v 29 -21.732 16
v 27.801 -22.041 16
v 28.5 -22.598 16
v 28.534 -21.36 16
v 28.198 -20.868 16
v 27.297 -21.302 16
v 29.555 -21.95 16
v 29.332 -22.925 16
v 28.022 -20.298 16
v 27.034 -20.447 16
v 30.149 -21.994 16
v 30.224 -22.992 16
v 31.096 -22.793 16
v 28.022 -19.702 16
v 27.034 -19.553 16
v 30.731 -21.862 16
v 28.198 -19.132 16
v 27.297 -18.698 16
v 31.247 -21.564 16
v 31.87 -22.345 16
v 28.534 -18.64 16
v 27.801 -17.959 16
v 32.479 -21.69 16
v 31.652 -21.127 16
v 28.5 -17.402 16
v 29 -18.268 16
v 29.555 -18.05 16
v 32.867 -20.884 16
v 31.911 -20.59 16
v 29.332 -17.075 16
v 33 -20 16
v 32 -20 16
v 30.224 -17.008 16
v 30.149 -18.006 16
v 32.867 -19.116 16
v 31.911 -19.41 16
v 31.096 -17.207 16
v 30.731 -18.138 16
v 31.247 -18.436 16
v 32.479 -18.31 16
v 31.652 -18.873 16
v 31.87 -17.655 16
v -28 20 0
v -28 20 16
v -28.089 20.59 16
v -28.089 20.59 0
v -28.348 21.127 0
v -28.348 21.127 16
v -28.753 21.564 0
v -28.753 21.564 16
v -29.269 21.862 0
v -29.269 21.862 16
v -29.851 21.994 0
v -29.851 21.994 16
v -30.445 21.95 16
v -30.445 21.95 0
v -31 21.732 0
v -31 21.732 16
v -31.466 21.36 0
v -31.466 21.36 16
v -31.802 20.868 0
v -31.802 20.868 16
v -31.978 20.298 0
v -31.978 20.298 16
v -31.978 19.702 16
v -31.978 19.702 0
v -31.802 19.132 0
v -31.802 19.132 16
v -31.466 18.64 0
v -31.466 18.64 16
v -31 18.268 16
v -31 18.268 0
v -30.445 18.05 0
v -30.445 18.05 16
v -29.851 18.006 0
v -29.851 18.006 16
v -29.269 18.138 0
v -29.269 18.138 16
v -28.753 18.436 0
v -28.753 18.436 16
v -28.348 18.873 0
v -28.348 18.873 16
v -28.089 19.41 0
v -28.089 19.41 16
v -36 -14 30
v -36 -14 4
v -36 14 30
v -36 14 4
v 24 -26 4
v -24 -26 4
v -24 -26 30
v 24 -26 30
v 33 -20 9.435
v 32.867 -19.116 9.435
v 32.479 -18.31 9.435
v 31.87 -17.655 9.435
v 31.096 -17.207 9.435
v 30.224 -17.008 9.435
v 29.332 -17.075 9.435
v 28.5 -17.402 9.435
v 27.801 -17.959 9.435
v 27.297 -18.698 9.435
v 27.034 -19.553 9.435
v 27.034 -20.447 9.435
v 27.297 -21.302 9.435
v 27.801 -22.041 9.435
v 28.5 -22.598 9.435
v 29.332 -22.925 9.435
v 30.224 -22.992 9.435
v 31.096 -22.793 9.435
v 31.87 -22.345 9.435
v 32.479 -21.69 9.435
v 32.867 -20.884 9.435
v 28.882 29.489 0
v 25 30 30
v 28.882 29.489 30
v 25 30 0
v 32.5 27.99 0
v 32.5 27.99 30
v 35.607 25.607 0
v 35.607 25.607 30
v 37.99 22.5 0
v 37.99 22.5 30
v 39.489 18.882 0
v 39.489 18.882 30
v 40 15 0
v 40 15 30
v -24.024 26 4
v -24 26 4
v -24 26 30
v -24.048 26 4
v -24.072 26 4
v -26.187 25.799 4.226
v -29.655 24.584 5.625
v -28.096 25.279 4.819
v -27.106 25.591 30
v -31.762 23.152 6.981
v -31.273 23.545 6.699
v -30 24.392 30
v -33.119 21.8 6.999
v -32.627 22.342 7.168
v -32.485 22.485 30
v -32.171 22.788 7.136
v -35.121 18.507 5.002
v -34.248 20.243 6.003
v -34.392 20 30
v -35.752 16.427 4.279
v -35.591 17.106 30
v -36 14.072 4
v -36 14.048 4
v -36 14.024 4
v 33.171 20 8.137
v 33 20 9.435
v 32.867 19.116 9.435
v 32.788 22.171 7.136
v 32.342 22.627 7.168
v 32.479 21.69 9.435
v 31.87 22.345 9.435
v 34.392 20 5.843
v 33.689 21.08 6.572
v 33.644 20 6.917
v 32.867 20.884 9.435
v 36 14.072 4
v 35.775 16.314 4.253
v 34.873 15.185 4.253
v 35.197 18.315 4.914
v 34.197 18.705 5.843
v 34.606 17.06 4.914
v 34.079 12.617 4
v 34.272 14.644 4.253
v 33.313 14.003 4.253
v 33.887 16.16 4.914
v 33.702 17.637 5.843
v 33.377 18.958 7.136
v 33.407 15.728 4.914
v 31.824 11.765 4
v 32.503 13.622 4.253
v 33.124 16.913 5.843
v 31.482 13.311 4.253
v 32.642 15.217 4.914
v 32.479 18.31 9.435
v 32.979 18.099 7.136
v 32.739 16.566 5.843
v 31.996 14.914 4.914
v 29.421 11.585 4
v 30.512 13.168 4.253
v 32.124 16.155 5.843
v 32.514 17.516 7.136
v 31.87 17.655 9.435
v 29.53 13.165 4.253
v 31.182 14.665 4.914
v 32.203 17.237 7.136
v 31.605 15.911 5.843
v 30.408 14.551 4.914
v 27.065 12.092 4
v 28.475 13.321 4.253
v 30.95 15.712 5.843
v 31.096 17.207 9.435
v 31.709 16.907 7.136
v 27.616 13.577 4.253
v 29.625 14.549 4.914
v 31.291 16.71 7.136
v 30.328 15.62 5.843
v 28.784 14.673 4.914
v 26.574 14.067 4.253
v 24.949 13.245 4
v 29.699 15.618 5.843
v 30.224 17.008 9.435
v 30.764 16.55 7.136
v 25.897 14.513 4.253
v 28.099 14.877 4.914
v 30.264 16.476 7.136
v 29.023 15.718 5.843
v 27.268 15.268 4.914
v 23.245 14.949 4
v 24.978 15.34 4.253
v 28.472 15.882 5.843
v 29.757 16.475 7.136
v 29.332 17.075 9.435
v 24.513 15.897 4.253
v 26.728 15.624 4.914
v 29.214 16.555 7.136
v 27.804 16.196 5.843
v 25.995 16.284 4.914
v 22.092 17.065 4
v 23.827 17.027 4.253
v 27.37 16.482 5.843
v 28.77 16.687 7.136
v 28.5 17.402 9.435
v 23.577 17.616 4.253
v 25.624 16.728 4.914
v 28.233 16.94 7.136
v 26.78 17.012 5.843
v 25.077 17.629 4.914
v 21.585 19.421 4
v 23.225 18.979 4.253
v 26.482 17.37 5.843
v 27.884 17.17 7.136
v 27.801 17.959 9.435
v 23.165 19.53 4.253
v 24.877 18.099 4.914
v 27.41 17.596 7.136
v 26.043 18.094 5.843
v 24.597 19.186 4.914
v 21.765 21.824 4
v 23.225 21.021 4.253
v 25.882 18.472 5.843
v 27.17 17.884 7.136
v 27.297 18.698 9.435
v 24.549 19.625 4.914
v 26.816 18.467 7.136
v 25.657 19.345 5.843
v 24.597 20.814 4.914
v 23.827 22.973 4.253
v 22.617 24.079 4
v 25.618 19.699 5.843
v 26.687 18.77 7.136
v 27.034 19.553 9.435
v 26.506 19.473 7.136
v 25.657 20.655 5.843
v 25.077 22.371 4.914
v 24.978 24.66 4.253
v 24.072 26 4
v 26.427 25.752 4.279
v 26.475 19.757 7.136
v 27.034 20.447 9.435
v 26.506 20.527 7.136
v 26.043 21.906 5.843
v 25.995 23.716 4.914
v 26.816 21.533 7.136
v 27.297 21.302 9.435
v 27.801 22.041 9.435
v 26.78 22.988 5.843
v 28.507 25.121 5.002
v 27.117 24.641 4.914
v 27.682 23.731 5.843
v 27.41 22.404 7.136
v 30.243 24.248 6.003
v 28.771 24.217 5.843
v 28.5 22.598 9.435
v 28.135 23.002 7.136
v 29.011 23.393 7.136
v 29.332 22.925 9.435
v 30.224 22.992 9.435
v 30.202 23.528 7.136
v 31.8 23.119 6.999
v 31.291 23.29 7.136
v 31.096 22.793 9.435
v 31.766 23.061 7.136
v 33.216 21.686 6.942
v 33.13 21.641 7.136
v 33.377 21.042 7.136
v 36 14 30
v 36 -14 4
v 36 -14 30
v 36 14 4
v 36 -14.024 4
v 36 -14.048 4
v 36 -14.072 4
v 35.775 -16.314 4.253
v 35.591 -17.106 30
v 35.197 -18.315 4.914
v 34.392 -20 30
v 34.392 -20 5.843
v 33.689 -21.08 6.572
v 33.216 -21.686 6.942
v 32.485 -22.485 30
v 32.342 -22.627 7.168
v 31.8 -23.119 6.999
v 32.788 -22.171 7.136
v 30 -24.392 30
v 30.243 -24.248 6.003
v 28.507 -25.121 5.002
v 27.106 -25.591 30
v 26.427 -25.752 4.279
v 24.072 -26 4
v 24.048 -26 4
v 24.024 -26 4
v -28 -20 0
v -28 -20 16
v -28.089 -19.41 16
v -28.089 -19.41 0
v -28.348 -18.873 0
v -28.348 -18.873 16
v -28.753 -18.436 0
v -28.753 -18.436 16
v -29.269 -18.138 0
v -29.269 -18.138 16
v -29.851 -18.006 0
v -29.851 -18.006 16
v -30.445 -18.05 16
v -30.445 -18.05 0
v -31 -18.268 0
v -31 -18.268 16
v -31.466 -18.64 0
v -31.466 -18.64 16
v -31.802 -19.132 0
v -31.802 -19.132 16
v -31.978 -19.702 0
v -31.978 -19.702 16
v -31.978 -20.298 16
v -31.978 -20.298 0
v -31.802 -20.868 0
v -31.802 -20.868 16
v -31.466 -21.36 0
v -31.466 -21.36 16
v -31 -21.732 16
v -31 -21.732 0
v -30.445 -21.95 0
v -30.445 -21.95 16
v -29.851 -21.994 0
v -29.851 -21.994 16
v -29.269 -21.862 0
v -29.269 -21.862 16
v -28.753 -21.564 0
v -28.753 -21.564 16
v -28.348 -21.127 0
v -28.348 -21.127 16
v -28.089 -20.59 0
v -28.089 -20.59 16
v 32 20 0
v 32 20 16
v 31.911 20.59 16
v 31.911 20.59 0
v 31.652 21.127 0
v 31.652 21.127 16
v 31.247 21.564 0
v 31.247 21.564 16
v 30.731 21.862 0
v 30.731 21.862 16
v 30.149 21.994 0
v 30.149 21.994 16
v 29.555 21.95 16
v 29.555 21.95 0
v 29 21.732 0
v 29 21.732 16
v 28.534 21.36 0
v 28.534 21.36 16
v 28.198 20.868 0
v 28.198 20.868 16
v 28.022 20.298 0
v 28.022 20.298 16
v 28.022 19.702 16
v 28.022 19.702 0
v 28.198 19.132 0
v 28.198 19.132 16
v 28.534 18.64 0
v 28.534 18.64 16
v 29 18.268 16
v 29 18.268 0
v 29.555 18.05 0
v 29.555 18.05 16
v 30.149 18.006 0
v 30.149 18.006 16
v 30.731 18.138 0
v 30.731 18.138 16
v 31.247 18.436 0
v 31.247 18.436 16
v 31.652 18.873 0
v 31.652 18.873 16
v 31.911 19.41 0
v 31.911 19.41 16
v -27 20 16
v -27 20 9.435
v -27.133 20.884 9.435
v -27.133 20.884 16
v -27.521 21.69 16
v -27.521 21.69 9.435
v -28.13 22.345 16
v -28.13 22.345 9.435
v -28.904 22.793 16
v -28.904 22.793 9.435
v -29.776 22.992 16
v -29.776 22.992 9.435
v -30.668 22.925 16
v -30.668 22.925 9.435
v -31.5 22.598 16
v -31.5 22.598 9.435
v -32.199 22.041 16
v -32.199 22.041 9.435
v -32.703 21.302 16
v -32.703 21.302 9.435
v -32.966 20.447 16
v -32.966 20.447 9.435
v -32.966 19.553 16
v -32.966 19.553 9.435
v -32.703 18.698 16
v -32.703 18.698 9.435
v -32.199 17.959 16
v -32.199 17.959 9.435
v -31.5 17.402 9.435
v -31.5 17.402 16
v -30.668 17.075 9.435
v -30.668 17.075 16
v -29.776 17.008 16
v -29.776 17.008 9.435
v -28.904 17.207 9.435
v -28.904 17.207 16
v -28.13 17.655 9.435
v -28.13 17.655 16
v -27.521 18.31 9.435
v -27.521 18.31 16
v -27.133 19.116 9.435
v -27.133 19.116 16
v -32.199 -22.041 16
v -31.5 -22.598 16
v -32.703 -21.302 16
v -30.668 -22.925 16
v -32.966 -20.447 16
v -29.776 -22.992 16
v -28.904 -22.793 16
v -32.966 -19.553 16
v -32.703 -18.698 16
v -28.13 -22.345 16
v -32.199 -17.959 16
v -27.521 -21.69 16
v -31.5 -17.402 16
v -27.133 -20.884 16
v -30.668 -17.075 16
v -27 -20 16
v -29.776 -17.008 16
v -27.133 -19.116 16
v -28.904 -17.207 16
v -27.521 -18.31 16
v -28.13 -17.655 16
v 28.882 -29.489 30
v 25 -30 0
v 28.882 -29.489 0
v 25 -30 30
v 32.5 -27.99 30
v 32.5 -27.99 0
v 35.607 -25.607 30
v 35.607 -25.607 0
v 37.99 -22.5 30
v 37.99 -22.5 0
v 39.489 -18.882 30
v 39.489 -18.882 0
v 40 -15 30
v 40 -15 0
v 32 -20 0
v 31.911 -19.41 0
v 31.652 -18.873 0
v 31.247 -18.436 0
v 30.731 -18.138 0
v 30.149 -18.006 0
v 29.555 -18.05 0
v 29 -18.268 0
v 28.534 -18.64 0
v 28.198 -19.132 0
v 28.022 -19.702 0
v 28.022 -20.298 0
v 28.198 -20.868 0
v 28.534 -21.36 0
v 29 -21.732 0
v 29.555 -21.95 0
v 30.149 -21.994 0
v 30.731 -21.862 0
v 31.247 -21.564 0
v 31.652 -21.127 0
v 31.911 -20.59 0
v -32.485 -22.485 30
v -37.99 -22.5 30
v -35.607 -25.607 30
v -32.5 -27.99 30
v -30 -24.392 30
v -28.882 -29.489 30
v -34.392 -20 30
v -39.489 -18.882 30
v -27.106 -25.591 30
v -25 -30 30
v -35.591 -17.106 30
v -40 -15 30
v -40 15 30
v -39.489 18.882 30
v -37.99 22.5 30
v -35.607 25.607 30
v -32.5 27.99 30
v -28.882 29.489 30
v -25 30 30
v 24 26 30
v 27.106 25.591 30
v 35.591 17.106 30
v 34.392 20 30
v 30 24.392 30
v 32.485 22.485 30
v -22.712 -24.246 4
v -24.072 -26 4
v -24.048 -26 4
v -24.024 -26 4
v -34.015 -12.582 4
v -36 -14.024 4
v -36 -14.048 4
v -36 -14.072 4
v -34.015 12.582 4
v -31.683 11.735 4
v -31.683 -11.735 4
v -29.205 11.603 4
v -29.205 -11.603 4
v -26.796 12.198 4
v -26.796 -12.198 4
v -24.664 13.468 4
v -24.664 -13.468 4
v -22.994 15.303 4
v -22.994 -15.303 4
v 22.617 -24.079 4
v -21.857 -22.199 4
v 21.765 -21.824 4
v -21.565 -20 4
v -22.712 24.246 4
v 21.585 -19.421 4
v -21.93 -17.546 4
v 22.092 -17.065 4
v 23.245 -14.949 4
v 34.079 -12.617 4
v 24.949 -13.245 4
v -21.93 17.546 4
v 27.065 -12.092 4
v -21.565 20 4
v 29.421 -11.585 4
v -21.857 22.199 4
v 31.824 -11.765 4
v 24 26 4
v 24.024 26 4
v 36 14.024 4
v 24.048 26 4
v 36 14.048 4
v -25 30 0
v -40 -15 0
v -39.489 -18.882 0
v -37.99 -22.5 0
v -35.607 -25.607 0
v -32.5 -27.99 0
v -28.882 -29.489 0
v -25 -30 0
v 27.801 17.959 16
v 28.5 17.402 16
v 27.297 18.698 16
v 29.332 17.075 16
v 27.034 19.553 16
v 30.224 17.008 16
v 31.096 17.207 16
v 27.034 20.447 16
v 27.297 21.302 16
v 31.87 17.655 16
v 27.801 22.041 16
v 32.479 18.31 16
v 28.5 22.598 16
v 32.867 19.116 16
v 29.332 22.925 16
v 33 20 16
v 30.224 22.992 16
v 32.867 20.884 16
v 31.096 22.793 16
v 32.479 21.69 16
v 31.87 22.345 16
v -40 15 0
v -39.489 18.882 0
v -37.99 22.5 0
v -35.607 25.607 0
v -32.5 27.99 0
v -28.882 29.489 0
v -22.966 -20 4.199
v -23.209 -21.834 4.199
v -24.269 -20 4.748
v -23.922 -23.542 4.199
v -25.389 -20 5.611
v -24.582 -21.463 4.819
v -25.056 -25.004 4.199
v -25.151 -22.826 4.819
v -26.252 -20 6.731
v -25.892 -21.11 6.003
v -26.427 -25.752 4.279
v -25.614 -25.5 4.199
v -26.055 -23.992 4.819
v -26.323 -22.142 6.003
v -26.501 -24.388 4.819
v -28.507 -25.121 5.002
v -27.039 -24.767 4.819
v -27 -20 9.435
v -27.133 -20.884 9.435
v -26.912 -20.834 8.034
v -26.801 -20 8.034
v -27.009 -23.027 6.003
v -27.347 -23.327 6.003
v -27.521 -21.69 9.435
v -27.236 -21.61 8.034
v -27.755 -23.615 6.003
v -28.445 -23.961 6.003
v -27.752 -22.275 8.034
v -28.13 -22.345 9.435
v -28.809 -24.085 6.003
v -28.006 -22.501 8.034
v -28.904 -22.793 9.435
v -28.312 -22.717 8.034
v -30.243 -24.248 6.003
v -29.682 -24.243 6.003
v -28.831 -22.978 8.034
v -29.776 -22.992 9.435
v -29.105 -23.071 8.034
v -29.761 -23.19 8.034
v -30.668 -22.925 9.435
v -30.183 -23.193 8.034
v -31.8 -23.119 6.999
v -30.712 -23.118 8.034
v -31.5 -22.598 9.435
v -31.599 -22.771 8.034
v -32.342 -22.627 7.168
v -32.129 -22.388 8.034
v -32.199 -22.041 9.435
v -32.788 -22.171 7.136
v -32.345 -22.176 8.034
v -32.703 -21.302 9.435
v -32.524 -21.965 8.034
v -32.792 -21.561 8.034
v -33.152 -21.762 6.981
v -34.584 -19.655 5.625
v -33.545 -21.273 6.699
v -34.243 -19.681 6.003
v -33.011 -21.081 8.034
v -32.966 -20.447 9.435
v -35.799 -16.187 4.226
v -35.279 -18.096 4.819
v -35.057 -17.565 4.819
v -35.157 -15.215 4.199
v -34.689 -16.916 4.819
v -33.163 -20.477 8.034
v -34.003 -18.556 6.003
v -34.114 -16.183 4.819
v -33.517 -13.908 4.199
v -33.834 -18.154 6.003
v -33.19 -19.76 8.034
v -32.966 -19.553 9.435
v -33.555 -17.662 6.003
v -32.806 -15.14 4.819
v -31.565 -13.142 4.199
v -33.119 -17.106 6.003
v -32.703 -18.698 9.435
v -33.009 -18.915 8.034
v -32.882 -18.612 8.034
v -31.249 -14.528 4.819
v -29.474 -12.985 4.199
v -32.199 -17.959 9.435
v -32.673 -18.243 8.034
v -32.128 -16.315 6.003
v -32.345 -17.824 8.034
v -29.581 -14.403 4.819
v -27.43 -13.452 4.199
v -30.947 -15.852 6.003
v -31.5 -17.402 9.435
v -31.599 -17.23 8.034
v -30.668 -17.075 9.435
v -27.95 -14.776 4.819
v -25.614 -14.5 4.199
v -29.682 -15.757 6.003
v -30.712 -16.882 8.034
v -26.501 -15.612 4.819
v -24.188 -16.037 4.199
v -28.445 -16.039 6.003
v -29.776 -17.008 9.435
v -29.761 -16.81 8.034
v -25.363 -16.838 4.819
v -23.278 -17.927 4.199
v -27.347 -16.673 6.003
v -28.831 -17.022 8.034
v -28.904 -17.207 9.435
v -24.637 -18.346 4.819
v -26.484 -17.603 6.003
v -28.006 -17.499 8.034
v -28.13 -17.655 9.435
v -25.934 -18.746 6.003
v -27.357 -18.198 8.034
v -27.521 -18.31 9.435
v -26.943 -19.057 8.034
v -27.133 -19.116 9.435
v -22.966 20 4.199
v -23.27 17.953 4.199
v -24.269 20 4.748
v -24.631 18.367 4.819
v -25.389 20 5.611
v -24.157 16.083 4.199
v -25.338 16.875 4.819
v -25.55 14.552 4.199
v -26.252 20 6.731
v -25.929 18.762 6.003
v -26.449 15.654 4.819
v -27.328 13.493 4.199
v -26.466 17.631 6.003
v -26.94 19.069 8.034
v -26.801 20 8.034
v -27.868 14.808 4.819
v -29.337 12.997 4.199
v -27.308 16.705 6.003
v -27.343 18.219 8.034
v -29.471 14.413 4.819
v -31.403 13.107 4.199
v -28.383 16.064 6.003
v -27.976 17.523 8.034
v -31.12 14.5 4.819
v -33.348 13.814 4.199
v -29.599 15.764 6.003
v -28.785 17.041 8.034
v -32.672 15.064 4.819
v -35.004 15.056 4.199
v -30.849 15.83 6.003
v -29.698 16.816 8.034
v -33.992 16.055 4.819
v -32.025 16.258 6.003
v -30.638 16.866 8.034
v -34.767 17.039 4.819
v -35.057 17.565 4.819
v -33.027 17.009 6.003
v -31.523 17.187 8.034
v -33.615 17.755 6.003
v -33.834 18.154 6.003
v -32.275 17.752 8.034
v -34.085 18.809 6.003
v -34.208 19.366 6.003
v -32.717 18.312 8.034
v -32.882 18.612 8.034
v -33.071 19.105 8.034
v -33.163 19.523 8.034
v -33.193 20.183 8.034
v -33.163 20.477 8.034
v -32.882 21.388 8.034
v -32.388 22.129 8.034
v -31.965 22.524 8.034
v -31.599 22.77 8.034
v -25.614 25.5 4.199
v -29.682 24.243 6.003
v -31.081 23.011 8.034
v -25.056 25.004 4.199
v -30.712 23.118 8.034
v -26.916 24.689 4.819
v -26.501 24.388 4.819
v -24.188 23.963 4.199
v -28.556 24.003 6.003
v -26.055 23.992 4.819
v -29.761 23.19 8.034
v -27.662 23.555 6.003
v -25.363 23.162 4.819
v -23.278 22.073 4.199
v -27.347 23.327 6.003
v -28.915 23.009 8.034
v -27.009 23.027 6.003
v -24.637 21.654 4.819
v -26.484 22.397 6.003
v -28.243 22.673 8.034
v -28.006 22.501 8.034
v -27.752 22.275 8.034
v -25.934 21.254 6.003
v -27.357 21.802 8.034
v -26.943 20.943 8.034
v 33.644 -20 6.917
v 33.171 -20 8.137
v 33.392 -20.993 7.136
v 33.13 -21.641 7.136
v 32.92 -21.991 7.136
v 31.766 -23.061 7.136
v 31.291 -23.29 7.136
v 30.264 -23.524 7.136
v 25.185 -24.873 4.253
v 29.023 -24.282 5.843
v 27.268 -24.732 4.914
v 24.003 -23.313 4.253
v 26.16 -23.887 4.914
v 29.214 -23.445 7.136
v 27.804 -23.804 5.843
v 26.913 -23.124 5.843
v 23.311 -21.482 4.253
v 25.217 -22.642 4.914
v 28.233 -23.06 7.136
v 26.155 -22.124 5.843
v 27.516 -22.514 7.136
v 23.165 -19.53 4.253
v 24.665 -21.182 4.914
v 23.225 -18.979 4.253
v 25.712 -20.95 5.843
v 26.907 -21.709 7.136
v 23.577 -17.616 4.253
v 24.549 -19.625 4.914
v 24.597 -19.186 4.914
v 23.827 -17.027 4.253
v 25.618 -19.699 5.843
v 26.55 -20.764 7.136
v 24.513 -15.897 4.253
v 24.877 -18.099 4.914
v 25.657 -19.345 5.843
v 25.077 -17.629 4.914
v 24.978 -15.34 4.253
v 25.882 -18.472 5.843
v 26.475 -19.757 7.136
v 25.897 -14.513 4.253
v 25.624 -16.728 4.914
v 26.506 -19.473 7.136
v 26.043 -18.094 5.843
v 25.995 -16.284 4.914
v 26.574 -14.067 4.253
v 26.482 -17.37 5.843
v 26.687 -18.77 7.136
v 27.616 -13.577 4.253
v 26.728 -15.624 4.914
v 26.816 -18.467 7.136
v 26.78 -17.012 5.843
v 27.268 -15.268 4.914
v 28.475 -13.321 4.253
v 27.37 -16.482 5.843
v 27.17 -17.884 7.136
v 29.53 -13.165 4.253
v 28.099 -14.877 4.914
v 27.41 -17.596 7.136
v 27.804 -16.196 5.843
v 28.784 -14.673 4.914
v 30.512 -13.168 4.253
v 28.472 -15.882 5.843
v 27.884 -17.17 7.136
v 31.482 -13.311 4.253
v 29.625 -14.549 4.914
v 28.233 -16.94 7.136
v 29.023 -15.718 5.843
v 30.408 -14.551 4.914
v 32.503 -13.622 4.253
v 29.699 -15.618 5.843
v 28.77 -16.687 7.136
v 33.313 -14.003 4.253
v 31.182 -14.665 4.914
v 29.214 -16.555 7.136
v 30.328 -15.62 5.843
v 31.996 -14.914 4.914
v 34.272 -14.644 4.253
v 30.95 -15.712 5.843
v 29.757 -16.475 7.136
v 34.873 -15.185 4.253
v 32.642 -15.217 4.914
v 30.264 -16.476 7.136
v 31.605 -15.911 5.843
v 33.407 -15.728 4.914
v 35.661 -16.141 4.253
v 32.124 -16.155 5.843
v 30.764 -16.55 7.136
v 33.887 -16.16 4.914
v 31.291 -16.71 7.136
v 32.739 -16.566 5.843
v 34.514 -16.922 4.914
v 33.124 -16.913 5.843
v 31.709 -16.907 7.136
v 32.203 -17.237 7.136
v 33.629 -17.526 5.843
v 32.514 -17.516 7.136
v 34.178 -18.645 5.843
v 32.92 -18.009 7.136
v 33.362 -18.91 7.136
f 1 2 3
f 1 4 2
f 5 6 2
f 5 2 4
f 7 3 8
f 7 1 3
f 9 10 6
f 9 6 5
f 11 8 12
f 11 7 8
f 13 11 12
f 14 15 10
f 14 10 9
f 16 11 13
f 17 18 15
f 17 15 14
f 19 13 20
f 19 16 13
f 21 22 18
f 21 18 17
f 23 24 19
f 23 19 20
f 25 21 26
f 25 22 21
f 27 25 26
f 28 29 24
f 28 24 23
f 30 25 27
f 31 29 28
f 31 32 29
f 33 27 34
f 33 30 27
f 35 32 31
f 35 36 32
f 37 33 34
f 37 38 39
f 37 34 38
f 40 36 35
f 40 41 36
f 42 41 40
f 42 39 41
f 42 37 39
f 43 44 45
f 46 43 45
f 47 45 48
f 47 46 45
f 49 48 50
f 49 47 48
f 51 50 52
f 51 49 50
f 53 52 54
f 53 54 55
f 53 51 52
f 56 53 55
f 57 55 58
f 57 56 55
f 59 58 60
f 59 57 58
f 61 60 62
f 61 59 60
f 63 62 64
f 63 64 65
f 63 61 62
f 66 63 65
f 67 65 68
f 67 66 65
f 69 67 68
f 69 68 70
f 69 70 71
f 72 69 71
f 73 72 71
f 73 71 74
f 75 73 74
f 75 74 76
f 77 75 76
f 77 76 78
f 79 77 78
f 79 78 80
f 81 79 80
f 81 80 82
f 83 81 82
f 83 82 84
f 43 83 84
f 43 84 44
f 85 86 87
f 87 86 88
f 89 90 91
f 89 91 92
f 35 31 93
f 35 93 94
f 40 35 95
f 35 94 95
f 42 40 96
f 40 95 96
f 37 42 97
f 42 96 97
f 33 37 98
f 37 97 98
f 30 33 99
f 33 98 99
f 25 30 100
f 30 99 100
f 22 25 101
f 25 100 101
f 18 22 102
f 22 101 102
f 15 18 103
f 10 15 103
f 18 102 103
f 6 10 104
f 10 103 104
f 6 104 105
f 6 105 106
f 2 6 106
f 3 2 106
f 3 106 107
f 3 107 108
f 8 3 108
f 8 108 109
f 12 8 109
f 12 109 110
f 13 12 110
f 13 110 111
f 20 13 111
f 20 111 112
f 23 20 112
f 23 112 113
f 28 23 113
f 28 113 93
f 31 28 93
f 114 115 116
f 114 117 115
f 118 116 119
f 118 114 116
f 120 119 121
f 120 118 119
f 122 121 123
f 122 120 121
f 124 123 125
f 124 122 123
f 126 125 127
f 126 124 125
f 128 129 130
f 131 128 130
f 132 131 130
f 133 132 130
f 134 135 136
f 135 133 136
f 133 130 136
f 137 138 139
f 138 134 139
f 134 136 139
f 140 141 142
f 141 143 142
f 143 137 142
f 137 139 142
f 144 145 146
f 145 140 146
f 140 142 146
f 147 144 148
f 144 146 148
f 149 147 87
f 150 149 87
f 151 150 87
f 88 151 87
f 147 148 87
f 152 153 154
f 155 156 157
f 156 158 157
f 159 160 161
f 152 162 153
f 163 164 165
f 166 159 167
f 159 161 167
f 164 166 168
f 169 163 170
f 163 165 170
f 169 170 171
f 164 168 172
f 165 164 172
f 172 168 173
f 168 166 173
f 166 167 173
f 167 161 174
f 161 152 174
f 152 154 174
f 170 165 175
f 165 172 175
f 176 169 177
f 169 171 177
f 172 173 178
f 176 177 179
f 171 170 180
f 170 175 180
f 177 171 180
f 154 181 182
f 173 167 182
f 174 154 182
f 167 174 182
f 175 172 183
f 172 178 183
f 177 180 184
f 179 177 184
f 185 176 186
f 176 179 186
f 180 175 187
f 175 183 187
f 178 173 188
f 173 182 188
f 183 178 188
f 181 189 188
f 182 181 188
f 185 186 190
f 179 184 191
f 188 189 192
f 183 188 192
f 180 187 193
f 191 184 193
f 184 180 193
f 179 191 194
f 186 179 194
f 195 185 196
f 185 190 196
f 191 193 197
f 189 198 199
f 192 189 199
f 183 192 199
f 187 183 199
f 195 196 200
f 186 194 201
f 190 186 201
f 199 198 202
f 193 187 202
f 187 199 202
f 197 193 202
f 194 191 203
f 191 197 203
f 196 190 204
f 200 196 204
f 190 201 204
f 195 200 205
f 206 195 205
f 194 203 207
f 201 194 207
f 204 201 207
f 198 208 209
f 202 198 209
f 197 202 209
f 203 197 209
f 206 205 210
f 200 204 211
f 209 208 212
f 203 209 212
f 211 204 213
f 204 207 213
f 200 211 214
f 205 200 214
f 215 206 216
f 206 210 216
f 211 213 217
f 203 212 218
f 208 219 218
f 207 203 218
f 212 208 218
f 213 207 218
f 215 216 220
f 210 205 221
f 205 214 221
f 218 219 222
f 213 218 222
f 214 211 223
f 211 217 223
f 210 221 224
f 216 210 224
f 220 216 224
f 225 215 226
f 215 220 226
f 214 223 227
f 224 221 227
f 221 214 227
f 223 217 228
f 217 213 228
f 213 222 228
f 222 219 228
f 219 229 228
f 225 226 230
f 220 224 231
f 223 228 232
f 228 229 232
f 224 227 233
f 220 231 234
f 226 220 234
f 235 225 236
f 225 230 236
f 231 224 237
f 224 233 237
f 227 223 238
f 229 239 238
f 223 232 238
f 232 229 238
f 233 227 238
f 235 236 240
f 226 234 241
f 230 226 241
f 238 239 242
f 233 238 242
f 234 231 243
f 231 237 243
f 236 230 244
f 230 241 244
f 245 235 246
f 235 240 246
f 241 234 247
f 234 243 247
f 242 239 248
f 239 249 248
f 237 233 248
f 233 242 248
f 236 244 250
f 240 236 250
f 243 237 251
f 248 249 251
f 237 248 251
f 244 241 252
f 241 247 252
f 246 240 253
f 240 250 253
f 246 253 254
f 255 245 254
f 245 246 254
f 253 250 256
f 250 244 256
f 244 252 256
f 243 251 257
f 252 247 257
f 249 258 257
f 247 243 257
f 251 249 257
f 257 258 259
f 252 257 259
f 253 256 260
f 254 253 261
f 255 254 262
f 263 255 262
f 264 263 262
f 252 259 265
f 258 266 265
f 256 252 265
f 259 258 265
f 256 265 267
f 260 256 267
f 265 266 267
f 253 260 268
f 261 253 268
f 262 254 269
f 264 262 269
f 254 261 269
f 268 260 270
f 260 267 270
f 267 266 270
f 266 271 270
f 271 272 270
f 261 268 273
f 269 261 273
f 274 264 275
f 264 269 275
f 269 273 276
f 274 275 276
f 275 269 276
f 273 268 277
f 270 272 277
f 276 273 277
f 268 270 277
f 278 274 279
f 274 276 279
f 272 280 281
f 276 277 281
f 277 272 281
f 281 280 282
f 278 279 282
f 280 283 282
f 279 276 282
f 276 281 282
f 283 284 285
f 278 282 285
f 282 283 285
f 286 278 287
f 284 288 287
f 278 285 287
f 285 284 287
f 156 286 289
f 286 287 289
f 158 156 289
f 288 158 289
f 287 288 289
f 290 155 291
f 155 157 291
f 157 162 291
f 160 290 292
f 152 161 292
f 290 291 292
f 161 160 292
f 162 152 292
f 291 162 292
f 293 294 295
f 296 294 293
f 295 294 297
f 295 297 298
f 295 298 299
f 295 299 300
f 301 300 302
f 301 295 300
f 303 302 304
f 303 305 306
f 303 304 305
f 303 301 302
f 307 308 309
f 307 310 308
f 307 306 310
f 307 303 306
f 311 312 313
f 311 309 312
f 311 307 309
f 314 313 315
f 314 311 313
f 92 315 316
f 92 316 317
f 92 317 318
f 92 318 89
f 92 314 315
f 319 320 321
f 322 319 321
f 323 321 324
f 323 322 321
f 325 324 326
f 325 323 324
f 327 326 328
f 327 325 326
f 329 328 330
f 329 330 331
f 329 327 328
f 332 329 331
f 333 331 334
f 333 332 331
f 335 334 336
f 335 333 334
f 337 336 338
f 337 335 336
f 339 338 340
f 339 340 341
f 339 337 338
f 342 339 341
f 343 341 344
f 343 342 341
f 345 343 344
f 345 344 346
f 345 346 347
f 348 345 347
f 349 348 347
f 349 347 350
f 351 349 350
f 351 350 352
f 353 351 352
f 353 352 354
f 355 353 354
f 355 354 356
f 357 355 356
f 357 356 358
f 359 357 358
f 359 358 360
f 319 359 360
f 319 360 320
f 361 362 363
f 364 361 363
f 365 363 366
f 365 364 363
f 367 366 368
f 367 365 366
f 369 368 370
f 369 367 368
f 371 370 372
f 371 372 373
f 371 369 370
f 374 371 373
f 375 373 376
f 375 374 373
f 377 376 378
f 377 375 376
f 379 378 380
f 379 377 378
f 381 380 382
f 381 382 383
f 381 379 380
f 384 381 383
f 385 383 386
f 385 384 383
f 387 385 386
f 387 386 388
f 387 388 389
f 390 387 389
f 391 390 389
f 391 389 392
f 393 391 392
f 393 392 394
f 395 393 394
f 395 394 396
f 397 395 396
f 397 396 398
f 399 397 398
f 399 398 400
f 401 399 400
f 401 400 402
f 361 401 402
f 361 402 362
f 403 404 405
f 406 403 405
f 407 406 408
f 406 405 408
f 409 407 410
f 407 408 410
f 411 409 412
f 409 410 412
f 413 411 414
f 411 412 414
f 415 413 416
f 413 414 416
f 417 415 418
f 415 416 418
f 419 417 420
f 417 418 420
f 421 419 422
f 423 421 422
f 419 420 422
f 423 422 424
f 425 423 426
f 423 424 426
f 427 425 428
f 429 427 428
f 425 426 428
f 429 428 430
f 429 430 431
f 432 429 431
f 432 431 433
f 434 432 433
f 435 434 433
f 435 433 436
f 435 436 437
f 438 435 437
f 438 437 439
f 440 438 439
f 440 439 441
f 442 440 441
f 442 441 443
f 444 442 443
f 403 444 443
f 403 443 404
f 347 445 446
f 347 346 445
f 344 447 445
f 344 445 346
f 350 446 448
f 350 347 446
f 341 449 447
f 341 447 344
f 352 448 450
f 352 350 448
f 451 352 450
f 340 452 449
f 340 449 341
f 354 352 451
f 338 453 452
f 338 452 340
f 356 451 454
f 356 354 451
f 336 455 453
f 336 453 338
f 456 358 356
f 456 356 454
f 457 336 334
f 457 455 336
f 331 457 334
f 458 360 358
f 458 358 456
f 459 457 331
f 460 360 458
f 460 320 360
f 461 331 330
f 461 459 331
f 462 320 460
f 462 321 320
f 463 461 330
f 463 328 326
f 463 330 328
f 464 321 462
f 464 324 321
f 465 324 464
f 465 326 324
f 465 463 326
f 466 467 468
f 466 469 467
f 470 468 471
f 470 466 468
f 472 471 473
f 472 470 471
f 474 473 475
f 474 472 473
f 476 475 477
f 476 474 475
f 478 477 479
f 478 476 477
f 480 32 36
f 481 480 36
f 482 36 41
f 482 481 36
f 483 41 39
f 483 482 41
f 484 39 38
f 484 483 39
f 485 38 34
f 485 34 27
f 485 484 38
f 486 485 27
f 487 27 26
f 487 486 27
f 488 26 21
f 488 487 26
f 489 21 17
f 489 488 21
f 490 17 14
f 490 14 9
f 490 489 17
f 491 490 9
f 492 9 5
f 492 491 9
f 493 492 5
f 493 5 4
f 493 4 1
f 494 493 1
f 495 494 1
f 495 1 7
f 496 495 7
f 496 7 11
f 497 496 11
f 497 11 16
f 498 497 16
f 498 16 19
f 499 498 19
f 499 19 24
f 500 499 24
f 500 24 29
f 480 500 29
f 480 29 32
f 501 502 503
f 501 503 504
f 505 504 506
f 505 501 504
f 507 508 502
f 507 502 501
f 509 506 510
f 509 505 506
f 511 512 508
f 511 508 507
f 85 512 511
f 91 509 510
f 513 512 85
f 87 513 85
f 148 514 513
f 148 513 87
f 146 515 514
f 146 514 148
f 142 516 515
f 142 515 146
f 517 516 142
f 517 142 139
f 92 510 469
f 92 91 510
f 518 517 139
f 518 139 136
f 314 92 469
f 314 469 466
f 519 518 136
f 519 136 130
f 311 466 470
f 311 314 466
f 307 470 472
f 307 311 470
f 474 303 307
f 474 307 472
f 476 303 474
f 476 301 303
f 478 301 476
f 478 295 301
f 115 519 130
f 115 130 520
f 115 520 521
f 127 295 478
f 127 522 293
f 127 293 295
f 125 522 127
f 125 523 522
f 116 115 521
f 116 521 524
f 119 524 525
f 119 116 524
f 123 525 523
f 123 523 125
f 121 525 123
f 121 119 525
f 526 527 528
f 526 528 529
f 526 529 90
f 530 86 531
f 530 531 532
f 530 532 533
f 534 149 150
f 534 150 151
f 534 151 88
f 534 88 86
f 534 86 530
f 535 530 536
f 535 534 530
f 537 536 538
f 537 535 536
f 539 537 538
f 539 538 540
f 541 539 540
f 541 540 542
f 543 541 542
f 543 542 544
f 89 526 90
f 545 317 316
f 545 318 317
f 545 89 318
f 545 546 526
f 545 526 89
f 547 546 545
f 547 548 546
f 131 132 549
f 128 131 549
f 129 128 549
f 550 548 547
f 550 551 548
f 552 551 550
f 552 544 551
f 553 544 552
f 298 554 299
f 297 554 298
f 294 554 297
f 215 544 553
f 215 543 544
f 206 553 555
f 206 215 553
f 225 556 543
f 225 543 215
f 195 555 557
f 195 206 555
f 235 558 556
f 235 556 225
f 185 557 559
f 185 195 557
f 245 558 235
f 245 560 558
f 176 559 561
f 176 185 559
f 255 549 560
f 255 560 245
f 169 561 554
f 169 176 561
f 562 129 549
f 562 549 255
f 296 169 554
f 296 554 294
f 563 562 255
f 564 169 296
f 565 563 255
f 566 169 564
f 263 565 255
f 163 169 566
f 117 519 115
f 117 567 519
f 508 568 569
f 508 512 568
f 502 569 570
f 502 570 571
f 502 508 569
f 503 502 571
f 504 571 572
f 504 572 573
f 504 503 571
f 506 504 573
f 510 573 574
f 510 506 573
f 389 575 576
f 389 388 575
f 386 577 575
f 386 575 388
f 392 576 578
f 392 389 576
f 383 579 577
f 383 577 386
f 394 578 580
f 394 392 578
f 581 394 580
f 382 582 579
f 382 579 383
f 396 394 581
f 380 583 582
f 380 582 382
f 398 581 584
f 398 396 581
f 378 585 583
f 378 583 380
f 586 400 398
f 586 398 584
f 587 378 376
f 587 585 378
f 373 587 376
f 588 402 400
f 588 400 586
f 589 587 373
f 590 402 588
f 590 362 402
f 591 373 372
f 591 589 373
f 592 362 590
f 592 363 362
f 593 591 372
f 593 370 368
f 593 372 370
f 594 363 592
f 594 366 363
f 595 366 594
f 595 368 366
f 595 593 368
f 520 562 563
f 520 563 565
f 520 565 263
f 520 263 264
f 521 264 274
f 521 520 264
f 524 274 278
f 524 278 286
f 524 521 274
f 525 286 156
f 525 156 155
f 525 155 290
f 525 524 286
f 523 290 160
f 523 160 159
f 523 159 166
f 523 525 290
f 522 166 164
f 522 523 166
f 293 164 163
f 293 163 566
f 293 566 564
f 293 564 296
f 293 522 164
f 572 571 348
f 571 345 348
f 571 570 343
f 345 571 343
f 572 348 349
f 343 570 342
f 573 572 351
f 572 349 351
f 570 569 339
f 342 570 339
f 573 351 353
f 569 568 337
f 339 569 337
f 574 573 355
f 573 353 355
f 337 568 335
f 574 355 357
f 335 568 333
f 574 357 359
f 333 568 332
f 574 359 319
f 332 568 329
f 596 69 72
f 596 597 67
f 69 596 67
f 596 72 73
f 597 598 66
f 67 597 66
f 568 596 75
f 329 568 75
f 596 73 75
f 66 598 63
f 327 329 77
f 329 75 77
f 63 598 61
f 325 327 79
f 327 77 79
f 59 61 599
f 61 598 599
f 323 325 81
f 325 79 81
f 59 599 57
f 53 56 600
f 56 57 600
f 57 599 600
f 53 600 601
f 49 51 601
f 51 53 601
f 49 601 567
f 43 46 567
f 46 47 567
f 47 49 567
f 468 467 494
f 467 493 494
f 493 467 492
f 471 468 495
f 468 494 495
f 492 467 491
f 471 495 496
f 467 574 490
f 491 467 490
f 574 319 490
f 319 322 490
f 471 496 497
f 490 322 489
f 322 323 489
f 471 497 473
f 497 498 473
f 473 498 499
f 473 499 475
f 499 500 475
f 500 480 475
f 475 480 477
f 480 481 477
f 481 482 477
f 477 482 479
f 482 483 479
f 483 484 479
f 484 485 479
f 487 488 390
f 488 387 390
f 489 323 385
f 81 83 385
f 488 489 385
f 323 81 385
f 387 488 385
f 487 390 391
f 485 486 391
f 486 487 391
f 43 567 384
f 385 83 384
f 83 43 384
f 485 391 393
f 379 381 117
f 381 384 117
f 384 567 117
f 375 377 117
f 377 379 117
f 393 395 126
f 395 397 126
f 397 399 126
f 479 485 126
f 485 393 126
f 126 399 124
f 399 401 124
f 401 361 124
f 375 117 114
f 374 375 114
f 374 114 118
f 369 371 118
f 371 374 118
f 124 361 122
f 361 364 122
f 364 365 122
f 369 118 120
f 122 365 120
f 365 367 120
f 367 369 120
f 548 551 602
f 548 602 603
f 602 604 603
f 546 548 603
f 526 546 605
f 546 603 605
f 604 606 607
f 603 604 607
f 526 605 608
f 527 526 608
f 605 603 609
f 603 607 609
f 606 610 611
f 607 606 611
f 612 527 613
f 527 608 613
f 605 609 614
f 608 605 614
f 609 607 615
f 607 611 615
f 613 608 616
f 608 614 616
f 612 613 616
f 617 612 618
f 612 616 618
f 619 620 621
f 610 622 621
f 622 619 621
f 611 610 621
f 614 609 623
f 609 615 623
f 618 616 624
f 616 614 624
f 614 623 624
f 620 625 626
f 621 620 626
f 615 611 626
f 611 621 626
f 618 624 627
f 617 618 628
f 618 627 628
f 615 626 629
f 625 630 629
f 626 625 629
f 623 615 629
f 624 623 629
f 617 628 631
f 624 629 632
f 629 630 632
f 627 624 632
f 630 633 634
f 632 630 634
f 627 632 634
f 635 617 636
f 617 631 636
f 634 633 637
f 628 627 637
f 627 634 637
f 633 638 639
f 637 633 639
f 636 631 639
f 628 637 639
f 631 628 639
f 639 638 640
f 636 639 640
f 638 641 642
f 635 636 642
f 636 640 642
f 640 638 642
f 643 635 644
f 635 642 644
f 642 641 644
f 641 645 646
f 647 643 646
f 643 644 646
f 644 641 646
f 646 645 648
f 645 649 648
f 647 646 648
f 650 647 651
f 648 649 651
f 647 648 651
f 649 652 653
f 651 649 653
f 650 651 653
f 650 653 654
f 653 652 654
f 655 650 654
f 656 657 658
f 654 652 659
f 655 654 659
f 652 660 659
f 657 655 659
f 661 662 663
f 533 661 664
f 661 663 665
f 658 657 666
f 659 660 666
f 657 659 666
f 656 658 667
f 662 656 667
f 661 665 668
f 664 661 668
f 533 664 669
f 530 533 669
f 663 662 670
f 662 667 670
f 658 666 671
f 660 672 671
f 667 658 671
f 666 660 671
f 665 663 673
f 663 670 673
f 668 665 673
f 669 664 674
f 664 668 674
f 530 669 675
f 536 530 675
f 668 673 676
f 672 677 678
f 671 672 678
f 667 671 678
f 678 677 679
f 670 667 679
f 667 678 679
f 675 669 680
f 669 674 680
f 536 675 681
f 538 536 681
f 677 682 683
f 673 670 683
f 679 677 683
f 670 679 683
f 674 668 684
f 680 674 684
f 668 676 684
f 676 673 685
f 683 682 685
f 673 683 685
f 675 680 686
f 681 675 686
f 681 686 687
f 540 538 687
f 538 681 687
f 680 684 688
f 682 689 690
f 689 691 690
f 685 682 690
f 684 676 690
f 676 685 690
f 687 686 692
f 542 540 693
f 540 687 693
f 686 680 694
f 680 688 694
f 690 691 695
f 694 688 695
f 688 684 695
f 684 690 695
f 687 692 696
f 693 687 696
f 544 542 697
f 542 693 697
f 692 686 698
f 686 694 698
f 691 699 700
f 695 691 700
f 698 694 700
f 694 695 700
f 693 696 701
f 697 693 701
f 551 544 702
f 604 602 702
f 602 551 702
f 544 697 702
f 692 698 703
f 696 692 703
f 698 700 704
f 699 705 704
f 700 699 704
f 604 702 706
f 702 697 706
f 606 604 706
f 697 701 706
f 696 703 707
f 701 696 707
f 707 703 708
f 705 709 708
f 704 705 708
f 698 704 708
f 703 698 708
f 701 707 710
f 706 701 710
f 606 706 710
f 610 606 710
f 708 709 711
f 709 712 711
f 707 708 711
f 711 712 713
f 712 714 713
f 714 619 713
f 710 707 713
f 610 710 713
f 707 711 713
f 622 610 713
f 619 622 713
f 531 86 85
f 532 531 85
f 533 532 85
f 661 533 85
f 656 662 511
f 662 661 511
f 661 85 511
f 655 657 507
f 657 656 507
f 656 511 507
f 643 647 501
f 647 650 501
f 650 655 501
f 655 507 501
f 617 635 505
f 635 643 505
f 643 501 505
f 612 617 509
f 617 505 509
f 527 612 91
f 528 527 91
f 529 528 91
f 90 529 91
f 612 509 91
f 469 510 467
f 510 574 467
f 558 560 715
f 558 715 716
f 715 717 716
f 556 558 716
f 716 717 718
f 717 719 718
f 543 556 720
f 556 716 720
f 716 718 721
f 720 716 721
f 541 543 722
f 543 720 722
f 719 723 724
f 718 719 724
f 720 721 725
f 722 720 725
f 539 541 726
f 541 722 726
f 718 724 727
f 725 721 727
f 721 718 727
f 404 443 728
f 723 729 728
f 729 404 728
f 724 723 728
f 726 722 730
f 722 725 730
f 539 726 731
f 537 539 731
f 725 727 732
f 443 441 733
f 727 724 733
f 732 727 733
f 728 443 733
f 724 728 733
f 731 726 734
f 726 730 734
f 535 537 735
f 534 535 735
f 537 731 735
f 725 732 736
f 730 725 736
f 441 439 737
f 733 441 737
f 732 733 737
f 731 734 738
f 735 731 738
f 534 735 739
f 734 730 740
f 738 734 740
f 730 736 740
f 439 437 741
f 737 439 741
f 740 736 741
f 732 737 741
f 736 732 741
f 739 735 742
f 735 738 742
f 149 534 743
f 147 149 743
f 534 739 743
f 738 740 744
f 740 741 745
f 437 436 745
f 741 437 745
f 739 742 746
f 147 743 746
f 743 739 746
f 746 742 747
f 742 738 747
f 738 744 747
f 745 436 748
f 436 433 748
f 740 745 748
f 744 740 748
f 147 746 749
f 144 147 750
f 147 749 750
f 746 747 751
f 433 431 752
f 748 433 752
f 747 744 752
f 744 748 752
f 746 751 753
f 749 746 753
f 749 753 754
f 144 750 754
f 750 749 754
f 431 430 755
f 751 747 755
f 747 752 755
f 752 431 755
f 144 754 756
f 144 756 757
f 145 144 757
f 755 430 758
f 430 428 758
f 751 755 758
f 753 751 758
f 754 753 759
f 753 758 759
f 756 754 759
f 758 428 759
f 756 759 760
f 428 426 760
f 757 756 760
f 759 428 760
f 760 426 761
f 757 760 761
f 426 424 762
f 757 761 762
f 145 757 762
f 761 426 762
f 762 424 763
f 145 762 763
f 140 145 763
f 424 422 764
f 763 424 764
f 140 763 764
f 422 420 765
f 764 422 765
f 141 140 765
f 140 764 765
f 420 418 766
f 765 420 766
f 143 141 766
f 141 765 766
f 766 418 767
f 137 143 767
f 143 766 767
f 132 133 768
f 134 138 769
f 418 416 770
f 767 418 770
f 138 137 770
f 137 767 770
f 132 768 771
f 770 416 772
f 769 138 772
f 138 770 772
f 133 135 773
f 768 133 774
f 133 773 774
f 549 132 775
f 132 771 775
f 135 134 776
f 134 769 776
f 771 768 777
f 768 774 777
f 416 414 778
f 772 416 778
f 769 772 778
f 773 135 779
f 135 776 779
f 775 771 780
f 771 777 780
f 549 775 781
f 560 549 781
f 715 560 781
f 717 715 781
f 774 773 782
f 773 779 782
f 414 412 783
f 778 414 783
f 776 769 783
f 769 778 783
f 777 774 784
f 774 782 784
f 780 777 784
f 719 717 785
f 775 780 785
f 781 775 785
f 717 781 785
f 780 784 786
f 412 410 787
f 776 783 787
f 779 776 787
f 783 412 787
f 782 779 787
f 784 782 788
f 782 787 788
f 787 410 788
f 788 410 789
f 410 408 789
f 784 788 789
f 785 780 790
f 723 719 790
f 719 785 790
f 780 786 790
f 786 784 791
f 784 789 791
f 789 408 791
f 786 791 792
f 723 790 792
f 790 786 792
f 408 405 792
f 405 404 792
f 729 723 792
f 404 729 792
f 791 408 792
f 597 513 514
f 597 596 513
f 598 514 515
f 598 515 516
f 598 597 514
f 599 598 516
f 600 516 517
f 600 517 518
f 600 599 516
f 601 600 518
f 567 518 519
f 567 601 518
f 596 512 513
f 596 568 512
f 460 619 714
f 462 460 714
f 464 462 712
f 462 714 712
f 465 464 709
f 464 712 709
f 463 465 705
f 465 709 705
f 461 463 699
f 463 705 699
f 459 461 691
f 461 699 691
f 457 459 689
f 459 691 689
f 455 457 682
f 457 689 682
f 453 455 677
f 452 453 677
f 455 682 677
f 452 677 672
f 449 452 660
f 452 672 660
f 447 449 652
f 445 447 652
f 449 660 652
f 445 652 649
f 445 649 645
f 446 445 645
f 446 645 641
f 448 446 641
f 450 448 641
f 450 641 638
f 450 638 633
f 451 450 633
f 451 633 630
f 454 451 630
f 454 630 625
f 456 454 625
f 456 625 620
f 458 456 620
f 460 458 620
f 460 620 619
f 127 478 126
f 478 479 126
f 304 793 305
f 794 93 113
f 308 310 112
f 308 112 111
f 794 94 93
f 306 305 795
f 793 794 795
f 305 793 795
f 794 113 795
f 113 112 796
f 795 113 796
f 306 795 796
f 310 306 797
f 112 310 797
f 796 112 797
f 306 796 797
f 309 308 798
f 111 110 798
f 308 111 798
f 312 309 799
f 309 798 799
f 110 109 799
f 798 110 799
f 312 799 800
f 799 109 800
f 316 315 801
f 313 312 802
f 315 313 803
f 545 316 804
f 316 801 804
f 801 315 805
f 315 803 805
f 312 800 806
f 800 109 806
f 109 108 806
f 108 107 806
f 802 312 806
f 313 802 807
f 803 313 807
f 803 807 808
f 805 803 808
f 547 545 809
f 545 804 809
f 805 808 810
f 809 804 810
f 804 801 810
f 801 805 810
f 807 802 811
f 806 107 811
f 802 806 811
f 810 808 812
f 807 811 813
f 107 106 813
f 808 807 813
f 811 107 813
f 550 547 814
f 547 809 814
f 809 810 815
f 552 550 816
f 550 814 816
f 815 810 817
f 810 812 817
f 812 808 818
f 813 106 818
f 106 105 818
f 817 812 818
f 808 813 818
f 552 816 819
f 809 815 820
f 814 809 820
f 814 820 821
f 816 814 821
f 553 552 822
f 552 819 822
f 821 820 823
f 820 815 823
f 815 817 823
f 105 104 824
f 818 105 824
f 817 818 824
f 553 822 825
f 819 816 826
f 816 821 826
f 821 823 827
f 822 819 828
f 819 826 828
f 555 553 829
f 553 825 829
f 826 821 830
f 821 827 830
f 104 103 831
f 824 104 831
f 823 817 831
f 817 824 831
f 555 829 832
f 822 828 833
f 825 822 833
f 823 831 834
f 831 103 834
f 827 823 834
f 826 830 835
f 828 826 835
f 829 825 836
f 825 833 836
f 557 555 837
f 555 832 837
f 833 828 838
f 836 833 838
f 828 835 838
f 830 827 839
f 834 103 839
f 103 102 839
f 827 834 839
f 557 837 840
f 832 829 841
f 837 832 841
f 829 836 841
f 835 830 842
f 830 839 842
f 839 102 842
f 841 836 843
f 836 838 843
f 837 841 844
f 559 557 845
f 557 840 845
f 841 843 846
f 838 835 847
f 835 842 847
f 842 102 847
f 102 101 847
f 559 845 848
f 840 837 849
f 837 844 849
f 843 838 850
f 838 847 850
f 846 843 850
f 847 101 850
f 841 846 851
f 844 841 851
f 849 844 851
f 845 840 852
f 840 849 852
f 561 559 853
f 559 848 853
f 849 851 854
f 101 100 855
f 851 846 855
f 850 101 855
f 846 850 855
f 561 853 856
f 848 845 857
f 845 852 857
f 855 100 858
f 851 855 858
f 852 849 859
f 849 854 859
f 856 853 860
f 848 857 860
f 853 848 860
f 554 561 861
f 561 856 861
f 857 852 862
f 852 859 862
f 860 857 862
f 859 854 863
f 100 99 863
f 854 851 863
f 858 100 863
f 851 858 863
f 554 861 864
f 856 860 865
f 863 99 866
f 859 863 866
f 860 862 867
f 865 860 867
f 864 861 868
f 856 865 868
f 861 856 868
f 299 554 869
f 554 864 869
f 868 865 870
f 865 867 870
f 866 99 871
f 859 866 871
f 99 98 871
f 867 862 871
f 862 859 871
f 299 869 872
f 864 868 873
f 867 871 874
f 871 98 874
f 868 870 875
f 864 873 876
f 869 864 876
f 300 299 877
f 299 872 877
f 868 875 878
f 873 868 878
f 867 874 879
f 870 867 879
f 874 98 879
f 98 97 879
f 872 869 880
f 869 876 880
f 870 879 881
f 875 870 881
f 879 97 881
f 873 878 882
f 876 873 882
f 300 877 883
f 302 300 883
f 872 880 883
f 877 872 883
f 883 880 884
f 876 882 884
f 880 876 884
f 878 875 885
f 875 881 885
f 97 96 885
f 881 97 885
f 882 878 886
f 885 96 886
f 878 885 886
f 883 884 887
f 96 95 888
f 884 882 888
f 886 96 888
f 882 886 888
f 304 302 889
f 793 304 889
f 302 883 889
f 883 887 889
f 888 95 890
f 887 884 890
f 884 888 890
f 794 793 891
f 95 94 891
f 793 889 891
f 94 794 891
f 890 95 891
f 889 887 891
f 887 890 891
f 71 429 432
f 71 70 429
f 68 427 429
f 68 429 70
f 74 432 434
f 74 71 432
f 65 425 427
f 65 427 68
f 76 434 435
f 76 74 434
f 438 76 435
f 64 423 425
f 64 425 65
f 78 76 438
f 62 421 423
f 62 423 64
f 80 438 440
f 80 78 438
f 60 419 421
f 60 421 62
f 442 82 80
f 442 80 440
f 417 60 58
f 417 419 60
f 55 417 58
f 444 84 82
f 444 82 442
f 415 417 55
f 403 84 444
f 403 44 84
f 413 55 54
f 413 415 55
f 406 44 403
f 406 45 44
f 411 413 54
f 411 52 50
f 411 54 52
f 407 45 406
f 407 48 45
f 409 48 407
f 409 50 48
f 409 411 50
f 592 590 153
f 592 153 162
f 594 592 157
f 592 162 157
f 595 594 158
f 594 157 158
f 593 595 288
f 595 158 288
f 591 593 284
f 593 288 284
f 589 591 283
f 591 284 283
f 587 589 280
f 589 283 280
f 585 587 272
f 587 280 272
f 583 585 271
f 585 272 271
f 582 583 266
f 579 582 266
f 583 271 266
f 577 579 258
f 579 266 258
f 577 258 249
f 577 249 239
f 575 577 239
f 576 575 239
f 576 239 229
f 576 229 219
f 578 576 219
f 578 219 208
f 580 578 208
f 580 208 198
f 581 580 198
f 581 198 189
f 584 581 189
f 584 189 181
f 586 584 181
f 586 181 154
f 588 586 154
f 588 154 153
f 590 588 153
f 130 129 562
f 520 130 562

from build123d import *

# Parameters (mm, degrees)
F0_W         = 80
F0_H         = 60
F0_W_2       = 72
F0_H_2       = 52
F0_R         = 3
F0_R_2       = 2
F1_DEPTH     = 4
F2_DEPTH     = 30
F3_DEPTH     = 16
F5_R         = 12
F6_R         = 15
F7_S5_R      = 12
F7_T6_DEPTH  = 15
F7_S11_R     = 12
F7_T12_DEPTH = 15
F7_S17_R     = 12
F7_T18_DEPTH = 15
F7_S23_R     = 12
F7_T24_DEPTH = 15


# Not quite as in the source:
# - a fillet or chamfer that OpenCascade refuses, or shapes differently, is made with other operations: its cross-section is extruded or revolved along the edge and cut away or added


with BuildPart() as f1:
    # F0 (on Top) → F1 (new body)
    with BuildSketch(Plane.XY):
        Rectangle(F0_W, F0_H)
        Rectangle(F0_W_2, F0_H_2, mode=Mode.SUBTRACT)
        Rectangle(F0_W_2, F0_H_2)
        with Locations((-30, -20)):
            Circle(F0_R, mode=Mode.SUBTRACT)
        with Locations((30, -20)):
            Circle(F0_R, mode=Mode.SUBTRACT)
        with Locations((-30, 20)):
            Circle(F0_R, mode=Mode.SUBTRACT)
        with Locations((30, 20)):
            Circle(F0_R, mode=Mode.SUBTRACT)
        with Locations((-30, 20)):
            Circle(F0_R)
        with Locations((-30, 20)):
            Circle(F0_R_2, mode=Mode.SUBTRACT)
        with Locations((30, 20)):
            Circle(F0_R)
        with Locations((30, 20)):
            Circle(F0_R_2, mode=Mode.SUBTRACT)
        with Locations((30, -20)):
            Circle(F0_R)
        with Locations((30, -20)):
            Circle(F0_R_2, mode=Mode.SUBTRACT)
        with Locations((-30, -20)):
            Circle(F0_R)
        with Locations((-30, -20)):
            Circle(F0_R_2, mode=Mode.SUBTRACT)
    extrude(amount=F1_DEPTH)

    # F0 (on Top) → F2 (join)
    with BuildSketch(Plane.XY):
        Rectangle(F0_W, F0_H)
        Rectangle(F0_W_2, F0_H_2, mode=Mode.SUBTRACT)
    extrude(amount=F2_DEPTH)

    # F0 (on Top) → F3 (join)
    with BuildSketch(Plane.XY):
        with Locations((-30, 20)):
            Circle(F0_R)
        with Locations((-30, 20)):
            Circle(F0_R_2, mode=Mode.SUBTRACT)
        with Locations((-30, -20)):
            Circle(F0_R)
        with Locations((-30, -20)):
            Circle(F0_R_2, mode=Mode.SUBTRACT)
        with Locations((30, 20)):
            Circle(F0_R)
        with Locations((30, 20)):
            Circle(F0_R_2, mode=Mode.SUBTRACT)
        with Locations((30, -20)):
            Circle(F0_R)
        with Locations((30, -20)):
            Circle(F0_R_2, mode=Mode.SUBTRACT)
    extrude(amount=F3_DEPTH)

    # F4: union 

    # F5
    f5_edges = [f1.edges().sort_by_distance(p)[0] for p in [
        (-36, 26, 17),
        (36, 26, 17),
        (-36, -26, 17),
        (36, -26, 17),
    ]]
    fillet(f5_edges, radius=F5_R)

    # F6
    f6_edges = [f1.edges().sort_by_distance(p)[0] for p in [
        (40, -30, 15),
        (-40, -30, 15),
        (40, 30, 15),
        (-40, 30, 15),
    ]]
    fillet(f6_edges, radius=F6_R)

    # F7: fillet of radius 5.5 on 4 edges, made by hand


with BuildPart() as f7_tool2:
    # F7_s3 → F7_t4 (revolve)
    with BuildSketch(Plane.XZ.offset(-20)):
        with BuildLine():
            ThreePointArc((-21.4990343146, 3.9996), (-25.3890872965, 5.6109127035), (-27.0004, 9.5009656854))
            Line((-27.0004, 9.5009656854), (-27.5505365685, 9.5009656854))
            ThreePointArc((-27.5505365685, 9.5009656854), (-27.5501365685, 6.7504828427), (-27.5501365685, 4))
            Line((-27.5501365685, 4), (-27, 3.4498634315))
            ThreePointArc((-27, 3.4498634315), (-24.2495171573, 3.4498634315), (-21.4990343146, 3.4494634315))
            Line((-21.4990343146, 3.4494634315), (-21.4990343146, 3.9996))
        make_face()
    revolve(axis=Axis((-30, 20, 4), (0, 0, -1)))

    # F7_s5 → F7_t6 (intersect, symmetric)
    with BuildSketch(Plane.XY.offset(8.4)):
        with Locations((-24, 14)):
            Circle(F7_S5_R)
    extrude(amount=F7_T6_DEPTH, both=True, mode=Mode.INTERSECT)


with BuildPart() as f1_1:
    add(f1.part)

    # F7_t1: union F7_tool2
    add(f7_tool2.part)


with BuildPart() as f7_tool8:
    # F7_s9 → F7_t10 (revolve)
    with BuildSketch(Plane.XZ.offset(20)):
        with BuildLine():
            ThreePointArc((-21.4990343146, 3.9996), (-25.3890872965, 5.6109127035), (-27.0004, 9.5009656854))
            Line((-27.0004, 9.5009656854), (-27.5505365685, 9.5009656854))
            ThreePointArc((-27.5505365685, 9.5009656854), (-27.5501365685, 6.7504828427), (-27.5501365685, 4))
            Line((-27.5501365685, 4), (-27, 3.4498634315))
            ThreePointArc((-27, 3.4498634315), (-24.2495171573, 3.4498634315), (-21.4990343146, 3.4494634315))
            Line((-21.4990343146, 3.4494634315), (-21.4990343146, 3.9996))
        make_face()
    revolve(axis=Axis((-30, -20, 4), (0, 0, -1)))

    # F7_s11 → F7_t12 (intersect, symmetric)
    with BuildSketch(Plane.XY.offset(8.4)):
        with Locations((-24, -14)):
            Circle(F7_S11_R)
    extrude(amount=F7_T12_DEPTH, both=True, mode=Mode.INTERSECT)


with BuildPart() as f1_2:
    add(f1_1.part)

    # F7_t7: union F7_tool8
    add(f7_tool8.part)


with BuildPart() as f7_tool14:
    # F7_s15 → F7_t16 (revolve)
    with BuildSketch(Plane.XZ.offset(-20)):
        with BuildLine():
            ThreePointArc((38.5009656854, 3.9996), (34.6109127035, 5.6109127035), (32.9996, 9.5009656854))
            Line((32.9996, 9.5009656854), (32.4494634315, 9.5009656854))
            ThreePointArc((32.4494634315, 9.5009656854), (32.4498634315, 6.7504828427), (32.4498634315, 4))
            Line((32.4498634315, 4), (33, 3.4498634315))
            ThreePointArc((33, 3.4498634315), (35.7504828427, 3.4498634315), (38.5009656854, 3.4494634315))
            Line((38.5009656854, 3.4494634315), (38.5009656854, 3.9996))
        make_face()
    revolve(axis=Axis((30, 20, 4), (0, 0, -1)))

    # F7_s17 → F7_t18 (intersect, symmetric)
    with BuildSketch(Plane.XY.offset(8.4)):
        with Locations((24, 14)):
            Circle(F7_S17_R)
    extrude(amount=F7_T18_DEPTH, both=True, mode=Mode.INTERSECT)


with BuildPart() as f1_3:
    add(f1_2.part)

    # F7_t13: union F7_tool14
    add(f7_tool14.part)


with BuildPart() as f7_tool20:
    # F7_s21 → F7_t22 (revolve)
    with BuildSketch(Plane.XZ.offset(20)):
        with BuildLine():
            ThreePointArc((38.5009656854, 3.9996), (34.6109127035, 5.6109127035), (32.9996, 9.5009656854))
            Line((32.9996, 9.5009656854), (32.4494634315, 9.5009656854))
            ThreePointArc((32.4494634315, 9.5009656854), (32.4498634315, 6.7504828427), (32.4498634315, 4))
            Line((32.4498634315, 4), (33, 3.4498634315))
            ThreePointArc((33, 3.4498634315), (35.7504828427, 3.4498634315), (38.5009656854, 3.4494634315))
            Line((38.5009656854, 3.4494634315), (38.5009656854, 3.9996))
        make_face()
    revolve(axis=Axis((30, -20, 4), (0, 0, -1)))

    # F7_s23 → F7_t24 (intersect, symmetric)
    with BuildSketch(Plane.XY.offset(8.4)):
        with Locations((24, -14)):
            Circle(F7_S23_R)
    extrude(amount=F7_T24_DEPTH, both=True, mode=Mode.INTERSECT)


with BuildPart() as f1_4:
    add(f1_3.part)

    # F7_t19: union F7_tool20
    add(f7_tool20.part)


solid = f1_4.part
